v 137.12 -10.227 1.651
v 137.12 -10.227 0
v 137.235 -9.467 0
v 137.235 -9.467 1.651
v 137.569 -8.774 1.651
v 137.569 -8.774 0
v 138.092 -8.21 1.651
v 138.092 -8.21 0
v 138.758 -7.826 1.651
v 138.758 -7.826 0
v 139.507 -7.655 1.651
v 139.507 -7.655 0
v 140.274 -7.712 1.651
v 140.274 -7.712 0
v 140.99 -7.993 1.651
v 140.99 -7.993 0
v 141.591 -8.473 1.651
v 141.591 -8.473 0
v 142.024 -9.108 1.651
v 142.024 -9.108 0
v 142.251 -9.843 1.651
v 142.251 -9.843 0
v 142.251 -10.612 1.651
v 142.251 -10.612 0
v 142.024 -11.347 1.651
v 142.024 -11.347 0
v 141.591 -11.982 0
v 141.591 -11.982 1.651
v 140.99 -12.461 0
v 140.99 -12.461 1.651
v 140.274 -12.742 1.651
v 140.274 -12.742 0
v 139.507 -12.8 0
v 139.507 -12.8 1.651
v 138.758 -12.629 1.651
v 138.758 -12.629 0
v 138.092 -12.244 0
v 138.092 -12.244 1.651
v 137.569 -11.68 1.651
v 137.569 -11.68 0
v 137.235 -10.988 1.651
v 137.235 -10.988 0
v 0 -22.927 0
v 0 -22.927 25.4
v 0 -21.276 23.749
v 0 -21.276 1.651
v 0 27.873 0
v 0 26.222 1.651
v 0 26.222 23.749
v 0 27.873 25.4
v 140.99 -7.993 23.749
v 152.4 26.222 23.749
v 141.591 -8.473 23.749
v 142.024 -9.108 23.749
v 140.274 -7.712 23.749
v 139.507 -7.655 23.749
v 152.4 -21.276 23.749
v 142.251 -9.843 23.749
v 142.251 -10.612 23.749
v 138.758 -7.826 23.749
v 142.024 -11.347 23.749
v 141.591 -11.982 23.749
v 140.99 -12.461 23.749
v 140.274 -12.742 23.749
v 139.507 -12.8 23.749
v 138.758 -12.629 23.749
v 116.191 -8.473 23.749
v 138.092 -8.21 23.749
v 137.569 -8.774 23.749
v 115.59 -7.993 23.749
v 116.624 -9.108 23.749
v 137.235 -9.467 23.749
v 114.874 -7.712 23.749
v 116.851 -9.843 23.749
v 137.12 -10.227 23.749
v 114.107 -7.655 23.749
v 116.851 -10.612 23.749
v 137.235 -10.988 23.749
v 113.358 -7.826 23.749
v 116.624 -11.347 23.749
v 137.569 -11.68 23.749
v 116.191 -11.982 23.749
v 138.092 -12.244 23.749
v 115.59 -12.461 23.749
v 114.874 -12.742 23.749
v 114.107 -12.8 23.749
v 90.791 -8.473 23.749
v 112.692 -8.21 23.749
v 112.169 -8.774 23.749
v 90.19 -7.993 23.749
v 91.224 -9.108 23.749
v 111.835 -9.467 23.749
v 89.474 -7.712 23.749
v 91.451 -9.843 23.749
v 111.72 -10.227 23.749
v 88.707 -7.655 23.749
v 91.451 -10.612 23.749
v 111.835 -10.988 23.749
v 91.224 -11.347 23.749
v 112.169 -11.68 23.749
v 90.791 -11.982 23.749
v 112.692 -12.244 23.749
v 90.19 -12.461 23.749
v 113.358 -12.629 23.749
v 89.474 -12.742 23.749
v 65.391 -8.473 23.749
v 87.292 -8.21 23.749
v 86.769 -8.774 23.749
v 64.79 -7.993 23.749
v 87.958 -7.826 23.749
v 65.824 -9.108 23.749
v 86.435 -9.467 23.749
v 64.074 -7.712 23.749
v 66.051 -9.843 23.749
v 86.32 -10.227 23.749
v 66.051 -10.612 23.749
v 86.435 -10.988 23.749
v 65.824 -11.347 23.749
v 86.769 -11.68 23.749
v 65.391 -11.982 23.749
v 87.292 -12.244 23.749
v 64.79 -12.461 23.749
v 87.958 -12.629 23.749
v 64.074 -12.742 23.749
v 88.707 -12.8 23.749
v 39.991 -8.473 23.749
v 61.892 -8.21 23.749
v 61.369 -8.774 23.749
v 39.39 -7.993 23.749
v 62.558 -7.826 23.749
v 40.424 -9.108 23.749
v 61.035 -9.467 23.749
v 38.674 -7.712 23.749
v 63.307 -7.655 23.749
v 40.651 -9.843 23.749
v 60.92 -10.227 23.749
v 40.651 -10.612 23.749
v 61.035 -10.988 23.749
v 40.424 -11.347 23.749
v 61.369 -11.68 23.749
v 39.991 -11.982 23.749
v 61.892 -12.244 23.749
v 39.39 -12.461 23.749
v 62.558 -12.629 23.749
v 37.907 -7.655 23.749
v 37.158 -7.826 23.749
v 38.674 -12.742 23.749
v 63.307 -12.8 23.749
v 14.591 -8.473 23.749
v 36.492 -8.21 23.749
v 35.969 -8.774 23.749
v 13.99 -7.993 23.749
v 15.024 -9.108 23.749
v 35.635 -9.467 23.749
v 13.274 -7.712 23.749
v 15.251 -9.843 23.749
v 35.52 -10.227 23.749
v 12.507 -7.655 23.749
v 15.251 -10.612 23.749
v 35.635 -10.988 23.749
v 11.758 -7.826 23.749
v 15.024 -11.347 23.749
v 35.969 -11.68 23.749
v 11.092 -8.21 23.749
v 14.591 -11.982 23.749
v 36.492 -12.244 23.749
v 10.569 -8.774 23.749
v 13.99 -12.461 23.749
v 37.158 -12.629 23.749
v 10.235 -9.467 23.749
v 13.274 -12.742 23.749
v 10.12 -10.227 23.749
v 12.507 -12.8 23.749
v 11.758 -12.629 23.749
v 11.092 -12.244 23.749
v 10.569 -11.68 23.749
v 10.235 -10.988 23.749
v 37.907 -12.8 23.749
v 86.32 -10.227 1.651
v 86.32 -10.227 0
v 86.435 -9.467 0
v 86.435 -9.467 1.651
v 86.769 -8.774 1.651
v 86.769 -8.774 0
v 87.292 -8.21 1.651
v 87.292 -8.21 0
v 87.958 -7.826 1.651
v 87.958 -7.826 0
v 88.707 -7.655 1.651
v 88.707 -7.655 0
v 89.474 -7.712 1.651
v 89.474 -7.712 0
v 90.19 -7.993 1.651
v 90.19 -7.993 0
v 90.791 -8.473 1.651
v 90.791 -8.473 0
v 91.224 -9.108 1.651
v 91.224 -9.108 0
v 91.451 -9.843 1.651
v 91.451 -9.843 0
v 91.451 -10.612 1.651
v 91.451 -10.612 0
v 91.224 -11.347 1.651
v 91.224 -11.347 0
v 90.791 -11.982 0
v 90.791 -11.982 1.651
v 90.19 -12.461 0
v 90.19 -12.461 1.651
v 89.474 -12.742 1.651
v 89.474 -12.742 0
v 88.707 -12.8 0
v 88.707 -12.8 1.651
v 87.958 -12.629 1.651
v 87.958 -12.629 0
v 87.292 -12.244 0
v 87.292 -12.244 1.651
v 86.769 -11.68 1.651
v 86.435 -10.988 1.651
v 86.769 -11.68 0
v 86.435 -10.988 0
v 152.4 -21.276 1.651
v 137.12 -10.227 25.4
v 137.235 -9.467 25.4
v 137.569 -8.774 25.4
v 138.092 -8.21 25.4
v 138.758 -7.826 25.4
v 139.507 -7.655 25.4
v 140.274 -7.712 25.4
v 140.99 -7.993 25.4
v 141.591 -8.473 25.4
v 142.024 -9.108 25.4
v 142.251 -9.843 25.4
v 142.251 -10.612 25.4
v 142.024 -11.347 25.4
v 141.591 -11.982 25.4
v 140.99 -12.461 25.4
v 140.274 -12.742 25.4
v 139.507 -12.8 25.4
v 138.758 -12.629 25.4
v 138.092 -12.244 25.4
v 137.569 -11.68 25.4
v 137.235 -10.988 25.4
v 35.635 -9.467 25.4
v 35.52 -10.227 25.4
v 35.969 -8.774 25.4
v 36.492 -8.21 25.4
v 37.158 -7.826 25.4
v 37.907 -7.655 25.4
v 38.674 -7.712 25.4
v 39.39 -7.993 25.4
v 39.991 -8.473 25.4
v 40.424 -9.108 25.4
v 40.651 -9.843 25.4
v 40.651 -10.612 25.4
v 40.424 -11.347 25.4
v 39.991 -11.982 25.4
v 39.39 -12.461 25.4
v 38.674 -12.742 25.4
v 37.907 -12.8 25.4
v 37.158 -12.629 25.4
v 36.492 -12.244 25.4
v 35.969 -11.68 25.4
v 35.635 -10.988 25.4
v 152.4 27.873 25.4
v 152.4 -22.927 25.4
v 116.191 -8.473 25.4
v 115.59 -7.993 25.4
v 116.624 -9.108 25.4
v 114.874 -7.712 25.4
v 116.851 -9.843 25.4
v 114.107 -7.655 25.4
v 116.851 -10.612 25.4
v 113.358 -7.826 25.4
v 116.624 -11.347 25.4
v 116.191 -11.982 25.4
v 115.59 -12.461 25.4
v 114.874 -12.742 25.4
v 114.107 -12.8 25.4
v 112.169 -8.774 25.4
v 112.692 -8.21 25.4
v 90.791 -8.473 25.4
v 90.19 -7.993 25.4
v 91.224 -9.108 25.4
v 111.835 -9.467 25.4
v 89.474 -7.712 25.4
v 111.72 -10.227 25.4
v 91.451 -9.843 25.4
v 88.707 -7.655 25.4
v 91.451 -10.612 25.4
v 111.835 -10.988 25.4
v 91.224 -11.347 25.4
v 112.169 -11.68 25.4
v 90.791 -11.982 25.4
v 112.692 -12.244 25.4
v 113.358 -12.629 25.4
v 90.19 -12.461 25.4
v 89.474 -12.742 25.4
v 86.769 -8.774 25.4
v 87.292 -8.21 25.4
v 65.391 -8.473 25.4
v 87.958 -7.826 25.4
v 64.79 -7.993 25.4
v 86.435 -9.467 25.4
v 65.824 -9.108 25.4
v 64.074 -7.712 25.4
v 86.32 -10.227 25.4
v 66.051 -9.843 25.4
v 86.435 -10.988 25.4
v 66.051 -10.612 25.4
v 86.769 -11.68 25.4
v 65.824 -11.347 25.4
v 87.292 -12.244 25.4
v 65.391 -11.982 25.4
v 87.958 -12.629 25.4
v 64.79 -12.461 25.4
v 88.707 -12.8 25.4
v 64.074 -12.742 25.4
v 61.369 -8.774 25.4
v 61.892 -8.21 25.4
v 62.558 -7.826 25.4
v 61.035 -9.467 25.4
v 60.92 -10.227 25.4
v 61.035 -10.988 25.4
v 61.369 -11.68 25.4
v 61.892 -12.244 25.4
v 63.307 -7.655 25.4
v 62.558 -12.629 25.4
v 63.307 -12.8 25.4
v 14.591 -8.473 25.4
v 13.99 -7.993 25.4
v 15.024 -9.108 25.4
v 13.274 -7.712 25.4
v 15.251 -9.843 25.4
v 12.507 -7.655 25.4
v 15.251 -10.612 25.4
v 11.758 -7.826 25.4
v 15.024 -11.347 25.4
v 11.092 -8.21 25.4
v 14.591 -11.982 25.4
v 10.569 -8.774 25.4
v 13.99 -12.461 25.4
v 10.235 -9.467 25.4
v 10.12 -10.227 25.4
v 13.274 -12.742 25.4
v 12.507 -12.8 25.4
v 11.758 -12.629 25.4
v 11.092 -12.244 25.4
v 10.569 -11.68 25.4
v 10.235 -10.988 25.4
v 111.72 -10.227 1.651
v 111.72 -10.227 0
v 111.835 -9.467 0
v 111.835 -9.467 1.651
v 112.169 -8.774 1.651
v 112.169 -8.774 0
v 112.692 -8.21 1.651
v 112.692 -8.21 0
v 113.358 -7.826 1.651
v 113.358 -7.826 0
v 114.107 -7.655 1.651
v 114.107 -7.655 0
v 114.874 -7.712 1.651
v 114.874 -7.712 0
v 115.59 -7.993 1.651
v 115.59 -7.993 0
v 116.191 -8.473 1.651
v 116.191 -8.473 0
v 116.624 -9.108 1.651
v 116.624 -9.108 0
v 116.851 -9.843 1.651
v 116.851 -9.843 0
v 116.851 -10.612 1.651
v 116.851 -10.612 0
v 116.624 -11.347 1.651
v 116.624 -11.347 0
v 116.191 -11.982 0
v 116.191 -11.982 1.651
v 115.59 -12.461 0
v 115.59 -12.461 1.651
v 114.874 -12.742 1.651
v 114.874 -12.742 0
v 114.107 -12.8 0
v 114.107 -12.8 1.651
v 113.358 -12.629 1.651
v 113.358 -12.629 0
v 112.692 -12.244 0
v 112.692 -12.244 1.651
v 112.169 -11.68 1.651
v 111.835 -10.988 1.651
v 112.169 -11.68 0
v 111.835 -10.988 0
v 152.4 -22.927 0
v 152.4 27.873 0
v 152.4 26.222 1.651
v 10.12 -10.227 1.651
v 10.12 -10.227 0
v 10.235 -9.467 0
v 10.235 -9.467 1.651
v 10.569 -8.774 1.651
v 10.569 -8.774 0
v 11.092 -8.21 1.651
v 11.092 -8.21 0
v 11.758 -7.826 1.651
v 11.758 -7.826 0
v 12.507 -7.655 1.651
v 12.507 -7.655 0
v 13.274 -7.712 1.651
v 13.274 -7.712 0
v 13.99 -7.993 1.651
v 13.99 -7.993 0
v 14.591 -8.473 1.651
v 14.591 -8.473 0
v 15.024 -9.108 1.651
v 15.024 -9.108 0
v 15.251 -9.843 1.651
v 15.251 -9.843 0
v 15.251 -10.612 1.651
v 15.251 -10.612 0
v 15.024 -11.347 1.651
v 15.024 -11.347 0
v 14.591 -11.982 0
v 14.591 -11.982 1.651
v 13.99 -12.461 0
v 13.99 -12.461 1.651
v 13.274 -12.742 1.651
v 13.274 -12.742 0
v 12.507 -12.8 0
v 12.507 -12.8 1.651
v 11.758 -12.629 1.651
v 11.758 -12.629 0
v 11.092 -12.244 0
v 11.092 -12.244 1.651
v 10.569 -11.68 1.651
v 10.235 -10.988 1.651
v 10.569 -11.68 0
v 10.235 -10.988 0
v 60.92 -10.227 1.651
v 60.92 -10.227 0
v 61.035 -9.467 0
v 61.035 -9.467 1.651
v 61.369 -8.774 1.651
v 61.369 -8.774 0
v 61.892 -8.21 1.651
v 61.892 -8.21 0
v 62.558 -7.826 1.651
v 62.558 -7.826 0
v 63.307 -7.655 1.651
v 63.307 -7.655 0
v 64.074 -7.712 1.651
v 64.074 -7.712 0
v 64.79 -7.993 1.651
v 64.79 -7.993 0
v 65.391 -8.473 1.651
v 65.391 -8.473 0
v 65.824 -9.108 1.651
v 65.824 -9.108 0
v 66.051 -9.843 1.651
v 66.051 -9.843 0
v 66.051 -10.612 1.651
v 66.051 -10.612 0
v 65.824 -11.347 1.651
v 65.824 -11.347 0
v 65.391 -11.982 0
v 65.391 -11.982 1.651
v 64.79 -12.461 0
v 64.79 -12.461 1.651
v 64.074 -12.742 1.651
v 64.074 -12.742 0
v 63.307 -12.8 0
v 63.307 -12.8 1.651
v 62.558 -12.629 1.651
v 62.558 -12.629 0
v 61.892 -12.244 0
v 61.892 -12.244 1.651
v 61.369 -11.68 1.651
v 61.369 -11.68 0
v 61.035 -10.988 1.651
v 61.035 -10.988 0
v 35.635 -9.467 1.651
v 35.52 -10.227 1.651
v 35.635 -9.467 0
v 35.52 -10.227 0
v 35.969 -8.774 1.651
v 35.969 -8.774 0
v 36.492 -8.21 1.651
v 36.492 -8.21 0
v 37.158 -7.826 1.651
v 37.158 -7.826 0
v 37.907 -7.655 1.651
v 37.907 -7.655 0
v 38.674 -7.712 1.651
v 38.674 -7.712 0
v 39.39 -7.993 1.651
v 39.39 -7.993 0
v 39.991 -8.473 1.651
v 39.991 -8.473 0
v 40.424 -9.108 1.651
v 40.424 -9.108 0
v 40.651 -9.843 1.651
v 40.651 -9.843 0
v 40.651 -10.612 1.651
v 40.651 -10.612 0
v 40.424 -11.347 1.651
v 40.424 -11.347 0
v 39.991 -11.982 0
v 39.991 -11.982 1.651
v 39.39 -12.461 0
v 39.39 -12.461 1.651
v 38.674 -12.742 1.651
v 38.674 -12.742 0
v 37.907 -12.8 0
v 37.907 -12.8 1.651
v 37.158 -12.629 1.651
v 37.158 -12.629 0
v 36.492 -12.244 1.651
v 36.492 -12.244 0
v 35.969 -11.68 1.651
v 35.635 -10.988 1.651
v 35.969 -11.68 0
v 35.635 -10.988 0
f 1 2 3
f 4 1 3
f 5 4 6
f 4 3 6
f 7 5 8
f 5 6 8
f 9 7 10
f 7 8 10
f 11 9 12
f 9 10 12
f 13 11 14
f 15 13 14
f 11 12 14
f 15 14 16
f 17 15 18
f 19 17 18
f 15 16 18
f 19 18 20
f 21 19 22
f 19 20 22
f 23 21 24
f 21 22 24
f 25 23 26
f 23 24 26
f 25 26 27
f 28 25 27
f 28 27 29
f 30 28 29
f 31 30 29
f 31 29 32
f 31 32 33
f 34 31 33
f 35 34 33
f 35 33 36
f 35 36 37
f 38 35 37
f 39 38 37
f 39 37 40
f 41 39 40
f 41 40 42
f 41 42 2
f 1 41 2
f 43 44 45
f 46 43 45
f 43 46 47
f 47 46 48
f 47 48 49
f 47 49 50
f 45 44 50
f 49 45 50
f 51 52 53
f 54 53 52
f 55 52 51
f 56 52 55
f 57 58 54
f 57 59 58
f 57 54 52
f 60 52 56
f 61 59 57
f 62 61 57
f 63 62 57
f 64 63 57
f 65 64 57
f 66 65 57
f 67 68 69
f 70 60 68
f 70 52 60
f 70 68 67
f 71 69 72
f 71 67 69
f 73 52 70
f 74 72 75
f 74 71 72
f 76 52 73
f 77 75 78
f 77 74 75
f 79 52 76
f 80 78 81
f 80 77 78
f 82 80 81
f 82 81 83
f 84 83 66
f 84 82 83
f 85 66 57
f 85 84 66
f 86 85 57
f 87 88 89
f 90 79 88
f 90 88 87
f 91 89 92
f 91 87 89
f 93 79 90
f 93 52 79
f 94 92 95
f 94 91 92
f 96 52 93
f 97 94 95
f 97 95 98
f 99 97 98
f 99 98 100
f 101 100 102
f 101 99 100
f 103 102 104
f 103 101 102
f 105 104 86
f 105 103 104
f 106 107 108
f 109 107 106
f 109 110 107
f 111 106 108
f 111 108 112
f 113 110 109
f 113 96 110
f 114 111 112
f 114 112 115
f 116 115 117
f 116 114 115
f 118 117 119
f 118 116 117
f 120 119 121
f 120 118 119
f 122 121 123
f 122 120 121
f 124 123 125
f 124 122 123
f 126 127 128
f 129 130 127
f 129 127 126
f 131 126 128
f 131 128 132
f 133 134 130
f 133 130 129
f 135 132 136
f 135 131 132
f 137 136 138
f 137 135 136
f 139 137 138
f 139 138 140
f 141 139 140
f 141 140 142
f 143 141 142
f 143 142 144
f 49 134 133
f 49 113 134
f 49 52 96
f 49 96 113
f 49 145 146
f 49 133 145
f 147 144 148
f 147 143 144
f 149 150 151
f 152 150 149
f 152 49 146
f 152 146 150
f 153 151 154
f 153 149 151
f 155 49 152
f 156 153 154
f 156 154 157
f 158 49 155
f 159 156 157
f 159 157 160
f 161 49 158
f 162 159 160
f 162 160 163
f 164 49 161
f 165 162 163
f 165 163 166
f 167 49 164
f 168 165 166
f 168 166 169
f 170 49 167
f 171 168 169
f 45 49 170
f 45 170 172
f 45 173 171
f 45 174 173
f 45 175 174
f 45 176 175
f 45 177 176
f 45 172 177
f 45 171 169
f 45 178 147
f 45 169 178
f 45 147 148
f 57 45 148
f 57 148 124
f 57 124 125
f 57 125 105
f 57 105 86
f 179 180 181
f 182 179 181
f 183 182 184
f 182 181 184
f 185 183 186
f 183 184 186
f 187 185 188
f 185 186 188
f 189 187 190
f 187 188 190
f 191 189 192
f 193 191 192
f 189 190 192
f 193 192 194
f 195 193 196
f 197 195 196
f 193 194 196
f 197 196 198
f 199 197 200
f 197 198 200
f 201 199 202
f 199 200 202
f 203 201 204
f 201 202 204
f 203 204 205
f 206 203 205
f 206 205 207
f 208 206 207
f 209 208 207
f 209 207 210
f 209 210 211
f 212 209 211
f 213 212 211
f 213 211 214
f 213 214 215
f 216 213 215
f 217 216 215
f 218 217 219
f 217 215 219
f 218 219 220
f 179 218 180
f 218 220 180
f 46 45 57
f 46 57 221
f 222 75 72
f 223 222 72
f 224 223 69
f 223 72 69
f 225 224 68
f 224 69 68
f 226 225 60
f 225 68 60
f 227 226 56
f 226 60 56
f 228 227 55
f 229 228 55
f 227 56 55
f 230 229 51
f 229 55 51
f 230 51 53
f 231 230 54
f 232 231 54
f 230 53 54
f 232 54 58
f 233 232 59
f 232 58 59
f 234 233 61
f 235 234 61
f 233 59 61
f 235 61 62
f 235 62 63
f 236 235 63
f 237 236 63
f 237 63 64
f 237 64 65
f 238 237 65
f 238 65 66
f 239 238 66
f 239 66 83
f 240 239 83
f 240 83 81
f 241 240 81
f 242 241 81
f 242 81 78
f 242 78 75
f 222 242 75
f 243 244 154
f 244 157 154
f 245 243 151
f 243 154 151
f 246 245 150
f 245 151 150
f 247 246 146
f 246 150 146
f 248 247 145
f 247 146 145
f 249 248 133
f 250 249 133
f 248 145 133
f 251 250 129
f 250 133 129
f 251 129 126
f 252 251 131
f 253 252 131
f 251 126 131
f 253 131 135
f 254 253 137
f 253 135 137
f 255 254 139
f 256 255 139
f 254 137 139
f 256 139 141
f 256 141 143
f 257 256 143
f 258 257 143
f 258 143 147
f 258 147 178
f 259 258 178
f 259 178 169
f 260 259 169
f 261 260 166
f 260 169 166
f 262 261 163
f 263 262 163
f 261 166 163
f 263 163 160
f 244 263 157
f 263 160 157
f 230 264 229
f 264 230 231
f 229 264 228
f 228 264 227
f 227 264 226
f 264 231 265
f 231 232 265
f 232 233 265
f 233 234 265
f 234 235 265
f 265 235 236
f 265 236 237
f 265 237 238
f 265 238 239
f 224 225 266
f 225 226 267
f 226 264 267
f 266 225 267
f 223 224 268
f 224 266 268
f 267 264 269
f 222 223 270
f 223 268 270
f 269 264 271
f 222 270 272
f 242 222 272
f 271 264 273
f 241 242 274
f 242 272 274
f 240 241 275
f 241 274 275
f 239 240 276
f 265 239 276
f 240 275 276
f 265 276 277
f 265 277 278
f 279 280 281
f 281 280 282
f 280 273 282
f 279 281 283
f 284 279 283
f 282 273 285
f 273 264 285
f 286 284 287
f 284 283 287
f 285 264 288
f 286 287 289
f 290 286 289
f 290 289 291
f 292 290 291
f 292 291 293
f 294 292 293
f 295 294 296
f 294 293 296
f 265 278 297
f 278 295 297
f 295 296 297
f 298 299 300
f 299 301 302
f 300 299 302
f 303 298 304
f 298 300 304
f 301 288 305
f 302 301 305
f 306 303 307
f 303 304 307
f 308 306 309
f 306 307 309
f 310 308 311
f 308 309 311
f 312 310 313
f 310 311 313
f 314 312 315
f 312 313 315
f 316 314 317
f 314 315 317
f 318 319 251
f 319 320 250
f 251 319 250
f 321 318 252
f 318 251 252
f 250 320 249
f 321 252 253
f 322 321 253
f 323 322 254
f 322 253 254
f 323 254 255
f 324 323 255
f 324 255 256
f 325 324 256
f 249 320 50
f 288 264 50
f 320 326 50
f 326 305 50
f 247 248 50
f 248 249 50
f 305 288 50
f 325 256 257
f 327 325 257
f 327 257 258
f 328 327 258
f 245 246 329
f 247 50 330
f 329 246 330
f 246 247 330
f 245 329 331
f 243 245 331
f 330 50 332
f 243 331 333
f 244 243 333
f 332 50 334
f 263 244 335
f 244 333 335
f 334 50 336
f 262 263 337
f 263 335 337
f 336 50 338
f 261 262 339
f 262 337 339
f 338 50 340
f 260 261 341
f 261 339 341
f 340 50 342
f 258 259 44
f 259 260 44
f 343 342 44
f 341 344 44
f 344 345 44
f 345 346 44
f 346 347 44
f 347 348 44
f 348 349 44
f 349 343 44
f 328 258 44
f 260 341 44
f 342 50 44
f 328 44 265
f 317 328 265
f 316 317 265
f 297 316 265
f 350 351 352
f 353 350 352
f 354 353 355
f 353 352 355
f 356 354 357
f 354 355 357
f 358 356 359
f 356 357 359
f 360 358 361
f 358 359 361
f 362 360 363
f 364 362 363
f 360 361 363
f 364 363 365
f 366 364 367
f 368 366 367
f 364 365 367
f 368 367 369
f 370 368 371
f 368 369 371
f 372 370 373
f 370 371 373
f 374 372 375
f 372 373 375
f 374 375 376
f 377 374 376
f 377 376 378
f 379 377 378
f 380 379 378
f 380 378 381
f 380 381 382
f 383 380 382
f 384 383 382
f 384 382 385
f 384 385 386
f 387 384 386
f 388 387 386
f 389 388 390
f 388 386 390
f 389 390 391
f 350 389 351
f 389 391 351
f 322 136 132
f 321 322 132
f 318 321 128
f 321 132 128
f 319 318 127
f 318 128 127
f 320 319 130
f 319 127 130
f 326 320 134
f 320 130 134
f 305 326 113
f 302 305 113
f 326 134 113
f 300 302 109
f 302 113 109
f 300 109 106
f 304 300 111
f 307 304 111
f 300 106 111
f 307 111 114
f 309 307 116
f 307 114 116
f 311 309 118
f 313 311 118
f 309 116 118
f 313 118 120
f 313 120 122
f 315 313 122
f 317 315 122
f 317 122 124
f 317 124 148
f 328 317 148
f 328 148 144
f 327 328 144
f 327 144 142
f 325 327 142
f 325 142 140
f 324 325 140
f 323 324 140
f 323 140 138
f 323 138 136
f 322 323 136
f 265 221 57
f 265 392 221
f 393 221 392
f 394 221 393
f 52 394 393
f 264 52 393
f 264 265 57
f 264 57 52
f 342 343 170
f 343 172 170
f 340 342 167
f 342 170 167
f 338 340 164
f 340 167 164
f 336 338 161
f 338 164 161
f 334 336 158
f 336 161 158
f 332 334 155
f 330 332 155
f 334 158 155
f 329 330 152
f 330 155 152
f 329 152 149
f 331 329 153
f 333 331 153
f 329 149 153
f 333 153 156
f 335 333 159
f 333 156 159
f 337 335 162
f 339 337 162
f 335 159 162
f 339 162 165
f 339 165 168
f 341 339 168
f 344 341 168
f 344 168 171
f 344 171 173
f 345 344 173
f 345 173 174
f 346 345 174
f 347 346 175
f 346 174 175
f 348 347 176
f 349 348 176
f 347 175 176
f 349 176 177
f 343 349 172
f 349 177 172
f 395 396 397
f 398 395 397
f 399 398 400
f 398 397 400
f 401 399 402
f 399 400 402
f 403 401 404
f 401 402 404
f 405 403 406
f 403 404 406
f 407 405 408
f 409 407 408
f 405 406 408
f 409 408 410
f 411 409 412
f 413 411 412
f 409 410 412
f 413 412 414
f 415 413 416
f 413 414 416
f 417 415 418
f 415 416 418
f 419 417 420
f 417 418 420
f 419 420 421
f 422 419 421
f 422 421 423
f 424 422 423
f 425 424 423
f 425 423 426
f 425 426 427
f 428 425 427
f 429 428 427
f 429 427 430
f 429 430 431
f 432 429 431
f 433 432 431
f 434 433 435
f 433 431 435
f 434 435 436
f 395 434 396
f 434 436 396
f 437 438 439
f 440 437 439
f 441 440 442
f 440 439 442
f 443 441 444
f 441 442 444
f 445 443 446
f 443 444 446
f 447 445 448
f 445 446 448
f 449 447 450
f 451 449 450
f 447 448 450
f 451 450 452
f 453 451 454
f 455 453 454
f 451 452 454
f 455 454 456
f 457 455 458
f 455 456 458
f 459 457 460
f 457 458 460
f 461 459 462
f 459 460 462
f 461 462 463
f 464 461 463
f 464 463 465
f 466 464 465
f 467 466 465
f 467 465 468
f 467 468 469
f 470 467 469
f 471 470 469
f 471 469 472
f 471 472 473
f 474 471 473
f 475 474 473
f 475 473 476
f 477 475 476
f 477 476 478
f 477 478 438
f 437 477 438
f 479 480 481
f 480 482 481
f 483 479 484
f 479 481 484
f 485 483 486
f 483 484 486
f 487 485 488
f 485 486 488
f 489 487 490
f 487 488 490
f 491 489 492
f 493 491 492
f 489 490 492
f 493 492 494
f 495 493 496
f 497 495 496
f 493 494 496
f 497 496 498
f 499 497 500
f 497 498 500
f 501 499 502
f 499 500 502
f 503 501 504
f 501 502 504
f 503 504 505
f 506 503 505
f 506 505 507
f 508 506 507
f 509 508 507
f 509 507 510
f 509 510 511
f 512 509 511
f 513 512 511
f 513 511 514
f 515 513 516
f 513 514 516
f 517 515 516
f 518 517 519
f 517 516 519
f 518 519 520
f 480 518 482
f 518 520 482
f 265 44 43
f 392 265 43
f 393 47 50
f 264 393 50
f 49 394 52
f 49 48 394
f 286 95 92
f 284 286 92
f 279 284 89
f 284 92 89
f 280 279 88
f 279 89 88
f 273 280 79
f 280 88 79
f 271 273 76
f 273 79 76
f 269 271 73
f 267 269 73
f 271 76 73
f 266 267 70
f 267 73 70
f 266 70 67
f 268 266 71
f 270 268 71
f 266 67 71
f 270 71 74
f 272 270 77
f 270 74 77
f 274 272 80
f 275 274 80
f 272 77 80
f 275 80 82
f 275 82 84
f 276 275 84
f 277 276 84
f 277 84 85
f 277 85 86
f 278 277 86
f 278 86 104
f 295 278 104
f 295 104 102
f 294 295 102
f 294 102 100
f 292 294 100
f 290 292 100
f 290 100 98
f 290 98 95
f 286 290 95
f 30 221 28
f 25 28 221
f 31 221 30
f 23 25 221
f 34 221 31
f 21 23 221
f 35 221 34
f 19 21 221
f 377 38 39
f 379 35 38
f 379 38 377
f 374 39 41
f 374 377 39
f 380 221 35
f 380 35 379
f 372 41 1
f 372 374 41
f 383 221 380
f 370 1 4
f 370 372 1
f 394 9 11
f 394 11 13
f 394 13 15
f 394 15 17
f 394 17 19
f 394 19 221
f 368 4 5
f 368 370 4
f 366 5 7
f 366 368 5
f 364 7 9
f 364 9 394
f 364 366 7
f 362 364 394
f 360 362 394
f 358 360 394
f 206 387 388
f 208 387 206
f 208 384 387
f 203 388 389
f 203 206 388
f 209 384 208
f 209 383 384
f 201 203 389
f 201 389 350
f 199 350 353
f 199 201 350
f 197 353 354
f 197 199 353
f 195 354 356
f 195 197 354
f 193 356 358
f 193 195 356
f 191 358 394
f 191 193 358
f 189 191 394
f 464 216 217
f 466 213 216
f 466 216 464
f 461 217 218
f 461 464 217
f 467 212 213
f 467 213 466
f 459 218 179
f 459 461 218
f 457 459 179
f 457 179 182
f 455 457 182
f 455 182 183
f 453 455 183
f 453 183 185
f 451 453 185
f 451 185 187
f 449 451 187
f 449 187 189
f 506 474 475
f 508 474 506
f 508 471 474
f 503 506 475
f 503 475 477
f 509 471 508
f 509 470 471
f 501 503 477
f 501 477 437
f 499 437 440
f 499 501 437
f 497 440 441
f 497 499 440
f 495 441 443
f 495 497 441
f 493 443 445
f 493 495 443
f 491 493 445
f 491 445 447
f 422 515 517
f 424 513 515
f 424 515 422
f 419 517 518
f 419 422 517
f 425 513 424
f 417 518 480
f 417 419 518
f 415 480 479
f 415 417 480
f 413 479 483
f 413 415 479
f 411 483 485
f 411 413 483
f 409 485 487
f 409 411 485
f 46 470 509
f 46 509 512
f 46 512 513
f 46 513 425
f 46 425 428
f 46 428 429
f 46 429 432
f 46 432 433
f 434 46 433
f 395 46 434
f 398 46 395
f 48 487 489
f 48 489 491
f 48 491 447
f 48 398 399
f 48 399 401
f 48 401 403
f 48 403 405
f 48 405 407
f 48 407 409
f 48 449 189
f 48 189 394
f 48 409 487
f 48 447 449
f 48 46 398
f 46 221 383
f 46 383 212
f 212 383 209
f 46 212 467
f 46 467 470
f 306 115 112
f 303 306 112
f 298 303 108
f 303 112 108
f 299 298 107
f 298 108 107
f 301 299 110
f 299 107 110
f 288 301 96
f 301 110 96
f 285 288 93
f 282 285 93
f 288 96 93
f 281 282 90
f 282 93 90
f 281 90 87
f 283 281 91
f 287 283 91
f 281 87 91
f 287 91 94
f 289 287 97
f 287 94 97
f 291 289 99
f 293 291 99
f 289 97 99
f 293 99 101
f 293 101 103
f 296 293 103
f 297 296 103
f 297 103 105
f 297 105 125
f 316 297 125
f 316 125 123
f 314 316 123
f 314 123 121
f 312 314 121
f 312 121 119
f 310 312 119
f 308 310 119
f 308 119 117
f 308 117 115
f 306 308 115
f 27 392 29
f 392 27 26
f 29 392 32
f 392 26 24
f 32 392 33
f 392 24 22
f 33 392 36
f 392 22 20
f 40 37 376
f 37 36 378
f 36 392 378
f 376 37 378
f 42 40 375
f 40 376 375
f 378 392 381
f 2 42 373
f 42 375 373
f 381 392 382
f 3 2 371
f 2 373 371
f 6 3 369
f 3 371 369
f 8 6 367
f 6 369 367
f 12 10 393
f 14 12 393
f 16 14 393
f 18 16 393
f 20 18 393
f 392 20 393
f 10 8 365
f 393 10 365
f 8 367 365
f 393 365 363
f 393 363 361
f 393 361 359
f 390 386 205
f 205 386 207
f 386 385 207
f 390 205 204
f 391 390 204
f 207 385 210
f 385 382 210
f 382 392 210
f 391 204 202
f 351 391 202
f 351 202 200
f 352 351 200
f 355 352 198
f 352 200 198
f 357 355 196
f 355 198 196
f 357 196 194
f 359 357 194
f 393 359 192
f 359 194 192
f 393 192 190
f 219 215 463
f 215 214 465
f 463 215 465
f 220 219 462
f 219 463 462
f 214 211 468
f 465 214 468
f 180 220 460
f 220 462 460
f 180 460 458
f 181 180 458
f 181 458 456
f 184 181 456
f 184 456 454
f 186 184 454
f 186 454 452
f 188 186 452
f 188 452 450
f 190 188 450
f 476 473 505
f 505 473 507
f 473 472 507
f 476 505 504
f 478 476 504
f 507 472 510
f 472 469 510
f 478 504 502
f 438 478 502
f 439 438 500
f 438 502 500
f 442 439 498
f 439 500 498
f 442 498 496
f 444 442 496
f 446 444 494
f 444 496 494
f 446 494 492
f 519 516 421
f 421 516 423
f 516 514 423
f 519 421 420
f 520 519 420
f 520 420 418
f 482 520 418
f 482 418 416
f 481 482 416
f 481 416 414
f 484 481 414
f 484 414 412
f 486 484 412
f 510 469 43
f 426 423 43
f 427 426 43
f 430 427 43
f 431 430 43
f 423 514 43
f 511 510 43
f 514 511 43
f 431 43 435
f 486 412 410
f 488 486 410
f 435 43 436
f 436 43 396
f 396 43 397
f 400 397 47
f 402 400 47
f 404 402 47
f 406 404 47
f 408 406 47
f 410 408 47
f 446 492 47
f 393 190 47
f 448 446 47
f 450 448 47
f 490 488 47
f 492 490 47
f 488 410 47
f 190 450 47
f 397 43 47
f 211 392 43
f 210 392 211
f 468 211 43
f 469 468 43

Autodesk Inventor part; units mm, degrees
ref_plane "YZ Plane" through (0, 0, 0) normal (1, 0, 0) x (0, 1, 0)
ref_plane "XZ Plane" through (0, 0, 0) normal (0, 1, 0) x (-1, 0, 0)
ref_plane "XY Plane" through (0, 0, 0) normal (0, 0, 1) x (1, 0, 0)
sketch "Sketch1" plane through (0, 0, 0) normal (1, 0, 0) x (0, 1, 0)
  line L0 (-22.9273, 0) -> (27.8727, 0)
  line L1 (27.8727, 0) -> (27.8727, 25.4)
  line L2 (27.8727, 25.4) -> (-22.9273, 25.4)
  line L3 (-22.9273, 25.4) -> (-22.9273, 0)
  line L4 (26.2217, 23.749) -> (-21.2763, 23.749)
  line L5 (-21.2763, 23.749) -> (-21.2763, 1.651)
  line L6 (-21.2763, 1.651) -> (26.2217, 1.651)
  line L7 (26.2217, 1.651) -> (26.2217, 23.749)
  point P0 (0, 0)
  dimension "d0" = 25.4
  dimension "d1" = 50.8
  dimension "d2" = 1.651
  dimension "d3" = 1.651
  dimension "d4" = 1.651
  dimension "d5" = 1.651
extrude "Extrusion1" add sketch "Sketch1" along normal blind 152.4
sketch "Sketch2" plane through (0, -22.9273, 0) normal (0, 0, -1) x (-1, 0, 0)
  circle A0 centre (-63.5, 12.7) radius 2.5797
  circle A1 centre (-88.9, 12.7) radius 2.5797
  circle A2 centre (-38.1, 12.7) radius 2.5797
  circle A3 centre (-12.7, 12.7) radius 2.5797
  circle A4 centre (-114.3, 12.7) radius 2.5797
  circle A5 centre (-139.7, 12.7) radius 2.5797
  line L0 (0, 0) -> (0, 50.8) projected
  line L1 (-152.4, 0) -> (-152.4, 50.8) projected
  line L2 (0, 0) -> (-152.4, 0) projected
  point P0 (0, 22.9273)
  dimension "d8" = 5.1594
  dimension "d9" = 5.1594
  dimension "d13" = 5.1594
  dimension "d14" = 5.1594
  dimension "d15" = 5.1594
  dimension "d16" = 5.1594
  dimension "d17" = 25.4
  dimension "d18" = 12.7
  dimension "d20" = 88.9
  dimension "d21" = 12.7
  dimension "d22" = 12.7
  dimension "d23" = 63.5
  dimension "d24" = 25.4
  dimension "d25" = 12.7
  dimension "d26" = 12.7
  dimension "d27" = 12.7
  dimension "d28" = 12.7
  dimension "d29" = 12.7
extrude "Extrusion2" cut sketch "Sketch2" against normal blind 25.4
equation "\"d3\" = d2"
equation "\"d4\" = d2"
equation "\"d5\" = d2"
equation "\"d9\" = d8"
equation "\"d13\" = d8"
equation "\"d14\" = d8"
equation "\"d15\" = d8"
equation "\"d16\" = d8"
equation "\"d22\" = d21"
equation "\"d26\" = d21"
equation "\"d27\" = d21"
equation "\"d28\" = d21"
equation "\"d29\" = d21"
properties part number "Mounting part"
